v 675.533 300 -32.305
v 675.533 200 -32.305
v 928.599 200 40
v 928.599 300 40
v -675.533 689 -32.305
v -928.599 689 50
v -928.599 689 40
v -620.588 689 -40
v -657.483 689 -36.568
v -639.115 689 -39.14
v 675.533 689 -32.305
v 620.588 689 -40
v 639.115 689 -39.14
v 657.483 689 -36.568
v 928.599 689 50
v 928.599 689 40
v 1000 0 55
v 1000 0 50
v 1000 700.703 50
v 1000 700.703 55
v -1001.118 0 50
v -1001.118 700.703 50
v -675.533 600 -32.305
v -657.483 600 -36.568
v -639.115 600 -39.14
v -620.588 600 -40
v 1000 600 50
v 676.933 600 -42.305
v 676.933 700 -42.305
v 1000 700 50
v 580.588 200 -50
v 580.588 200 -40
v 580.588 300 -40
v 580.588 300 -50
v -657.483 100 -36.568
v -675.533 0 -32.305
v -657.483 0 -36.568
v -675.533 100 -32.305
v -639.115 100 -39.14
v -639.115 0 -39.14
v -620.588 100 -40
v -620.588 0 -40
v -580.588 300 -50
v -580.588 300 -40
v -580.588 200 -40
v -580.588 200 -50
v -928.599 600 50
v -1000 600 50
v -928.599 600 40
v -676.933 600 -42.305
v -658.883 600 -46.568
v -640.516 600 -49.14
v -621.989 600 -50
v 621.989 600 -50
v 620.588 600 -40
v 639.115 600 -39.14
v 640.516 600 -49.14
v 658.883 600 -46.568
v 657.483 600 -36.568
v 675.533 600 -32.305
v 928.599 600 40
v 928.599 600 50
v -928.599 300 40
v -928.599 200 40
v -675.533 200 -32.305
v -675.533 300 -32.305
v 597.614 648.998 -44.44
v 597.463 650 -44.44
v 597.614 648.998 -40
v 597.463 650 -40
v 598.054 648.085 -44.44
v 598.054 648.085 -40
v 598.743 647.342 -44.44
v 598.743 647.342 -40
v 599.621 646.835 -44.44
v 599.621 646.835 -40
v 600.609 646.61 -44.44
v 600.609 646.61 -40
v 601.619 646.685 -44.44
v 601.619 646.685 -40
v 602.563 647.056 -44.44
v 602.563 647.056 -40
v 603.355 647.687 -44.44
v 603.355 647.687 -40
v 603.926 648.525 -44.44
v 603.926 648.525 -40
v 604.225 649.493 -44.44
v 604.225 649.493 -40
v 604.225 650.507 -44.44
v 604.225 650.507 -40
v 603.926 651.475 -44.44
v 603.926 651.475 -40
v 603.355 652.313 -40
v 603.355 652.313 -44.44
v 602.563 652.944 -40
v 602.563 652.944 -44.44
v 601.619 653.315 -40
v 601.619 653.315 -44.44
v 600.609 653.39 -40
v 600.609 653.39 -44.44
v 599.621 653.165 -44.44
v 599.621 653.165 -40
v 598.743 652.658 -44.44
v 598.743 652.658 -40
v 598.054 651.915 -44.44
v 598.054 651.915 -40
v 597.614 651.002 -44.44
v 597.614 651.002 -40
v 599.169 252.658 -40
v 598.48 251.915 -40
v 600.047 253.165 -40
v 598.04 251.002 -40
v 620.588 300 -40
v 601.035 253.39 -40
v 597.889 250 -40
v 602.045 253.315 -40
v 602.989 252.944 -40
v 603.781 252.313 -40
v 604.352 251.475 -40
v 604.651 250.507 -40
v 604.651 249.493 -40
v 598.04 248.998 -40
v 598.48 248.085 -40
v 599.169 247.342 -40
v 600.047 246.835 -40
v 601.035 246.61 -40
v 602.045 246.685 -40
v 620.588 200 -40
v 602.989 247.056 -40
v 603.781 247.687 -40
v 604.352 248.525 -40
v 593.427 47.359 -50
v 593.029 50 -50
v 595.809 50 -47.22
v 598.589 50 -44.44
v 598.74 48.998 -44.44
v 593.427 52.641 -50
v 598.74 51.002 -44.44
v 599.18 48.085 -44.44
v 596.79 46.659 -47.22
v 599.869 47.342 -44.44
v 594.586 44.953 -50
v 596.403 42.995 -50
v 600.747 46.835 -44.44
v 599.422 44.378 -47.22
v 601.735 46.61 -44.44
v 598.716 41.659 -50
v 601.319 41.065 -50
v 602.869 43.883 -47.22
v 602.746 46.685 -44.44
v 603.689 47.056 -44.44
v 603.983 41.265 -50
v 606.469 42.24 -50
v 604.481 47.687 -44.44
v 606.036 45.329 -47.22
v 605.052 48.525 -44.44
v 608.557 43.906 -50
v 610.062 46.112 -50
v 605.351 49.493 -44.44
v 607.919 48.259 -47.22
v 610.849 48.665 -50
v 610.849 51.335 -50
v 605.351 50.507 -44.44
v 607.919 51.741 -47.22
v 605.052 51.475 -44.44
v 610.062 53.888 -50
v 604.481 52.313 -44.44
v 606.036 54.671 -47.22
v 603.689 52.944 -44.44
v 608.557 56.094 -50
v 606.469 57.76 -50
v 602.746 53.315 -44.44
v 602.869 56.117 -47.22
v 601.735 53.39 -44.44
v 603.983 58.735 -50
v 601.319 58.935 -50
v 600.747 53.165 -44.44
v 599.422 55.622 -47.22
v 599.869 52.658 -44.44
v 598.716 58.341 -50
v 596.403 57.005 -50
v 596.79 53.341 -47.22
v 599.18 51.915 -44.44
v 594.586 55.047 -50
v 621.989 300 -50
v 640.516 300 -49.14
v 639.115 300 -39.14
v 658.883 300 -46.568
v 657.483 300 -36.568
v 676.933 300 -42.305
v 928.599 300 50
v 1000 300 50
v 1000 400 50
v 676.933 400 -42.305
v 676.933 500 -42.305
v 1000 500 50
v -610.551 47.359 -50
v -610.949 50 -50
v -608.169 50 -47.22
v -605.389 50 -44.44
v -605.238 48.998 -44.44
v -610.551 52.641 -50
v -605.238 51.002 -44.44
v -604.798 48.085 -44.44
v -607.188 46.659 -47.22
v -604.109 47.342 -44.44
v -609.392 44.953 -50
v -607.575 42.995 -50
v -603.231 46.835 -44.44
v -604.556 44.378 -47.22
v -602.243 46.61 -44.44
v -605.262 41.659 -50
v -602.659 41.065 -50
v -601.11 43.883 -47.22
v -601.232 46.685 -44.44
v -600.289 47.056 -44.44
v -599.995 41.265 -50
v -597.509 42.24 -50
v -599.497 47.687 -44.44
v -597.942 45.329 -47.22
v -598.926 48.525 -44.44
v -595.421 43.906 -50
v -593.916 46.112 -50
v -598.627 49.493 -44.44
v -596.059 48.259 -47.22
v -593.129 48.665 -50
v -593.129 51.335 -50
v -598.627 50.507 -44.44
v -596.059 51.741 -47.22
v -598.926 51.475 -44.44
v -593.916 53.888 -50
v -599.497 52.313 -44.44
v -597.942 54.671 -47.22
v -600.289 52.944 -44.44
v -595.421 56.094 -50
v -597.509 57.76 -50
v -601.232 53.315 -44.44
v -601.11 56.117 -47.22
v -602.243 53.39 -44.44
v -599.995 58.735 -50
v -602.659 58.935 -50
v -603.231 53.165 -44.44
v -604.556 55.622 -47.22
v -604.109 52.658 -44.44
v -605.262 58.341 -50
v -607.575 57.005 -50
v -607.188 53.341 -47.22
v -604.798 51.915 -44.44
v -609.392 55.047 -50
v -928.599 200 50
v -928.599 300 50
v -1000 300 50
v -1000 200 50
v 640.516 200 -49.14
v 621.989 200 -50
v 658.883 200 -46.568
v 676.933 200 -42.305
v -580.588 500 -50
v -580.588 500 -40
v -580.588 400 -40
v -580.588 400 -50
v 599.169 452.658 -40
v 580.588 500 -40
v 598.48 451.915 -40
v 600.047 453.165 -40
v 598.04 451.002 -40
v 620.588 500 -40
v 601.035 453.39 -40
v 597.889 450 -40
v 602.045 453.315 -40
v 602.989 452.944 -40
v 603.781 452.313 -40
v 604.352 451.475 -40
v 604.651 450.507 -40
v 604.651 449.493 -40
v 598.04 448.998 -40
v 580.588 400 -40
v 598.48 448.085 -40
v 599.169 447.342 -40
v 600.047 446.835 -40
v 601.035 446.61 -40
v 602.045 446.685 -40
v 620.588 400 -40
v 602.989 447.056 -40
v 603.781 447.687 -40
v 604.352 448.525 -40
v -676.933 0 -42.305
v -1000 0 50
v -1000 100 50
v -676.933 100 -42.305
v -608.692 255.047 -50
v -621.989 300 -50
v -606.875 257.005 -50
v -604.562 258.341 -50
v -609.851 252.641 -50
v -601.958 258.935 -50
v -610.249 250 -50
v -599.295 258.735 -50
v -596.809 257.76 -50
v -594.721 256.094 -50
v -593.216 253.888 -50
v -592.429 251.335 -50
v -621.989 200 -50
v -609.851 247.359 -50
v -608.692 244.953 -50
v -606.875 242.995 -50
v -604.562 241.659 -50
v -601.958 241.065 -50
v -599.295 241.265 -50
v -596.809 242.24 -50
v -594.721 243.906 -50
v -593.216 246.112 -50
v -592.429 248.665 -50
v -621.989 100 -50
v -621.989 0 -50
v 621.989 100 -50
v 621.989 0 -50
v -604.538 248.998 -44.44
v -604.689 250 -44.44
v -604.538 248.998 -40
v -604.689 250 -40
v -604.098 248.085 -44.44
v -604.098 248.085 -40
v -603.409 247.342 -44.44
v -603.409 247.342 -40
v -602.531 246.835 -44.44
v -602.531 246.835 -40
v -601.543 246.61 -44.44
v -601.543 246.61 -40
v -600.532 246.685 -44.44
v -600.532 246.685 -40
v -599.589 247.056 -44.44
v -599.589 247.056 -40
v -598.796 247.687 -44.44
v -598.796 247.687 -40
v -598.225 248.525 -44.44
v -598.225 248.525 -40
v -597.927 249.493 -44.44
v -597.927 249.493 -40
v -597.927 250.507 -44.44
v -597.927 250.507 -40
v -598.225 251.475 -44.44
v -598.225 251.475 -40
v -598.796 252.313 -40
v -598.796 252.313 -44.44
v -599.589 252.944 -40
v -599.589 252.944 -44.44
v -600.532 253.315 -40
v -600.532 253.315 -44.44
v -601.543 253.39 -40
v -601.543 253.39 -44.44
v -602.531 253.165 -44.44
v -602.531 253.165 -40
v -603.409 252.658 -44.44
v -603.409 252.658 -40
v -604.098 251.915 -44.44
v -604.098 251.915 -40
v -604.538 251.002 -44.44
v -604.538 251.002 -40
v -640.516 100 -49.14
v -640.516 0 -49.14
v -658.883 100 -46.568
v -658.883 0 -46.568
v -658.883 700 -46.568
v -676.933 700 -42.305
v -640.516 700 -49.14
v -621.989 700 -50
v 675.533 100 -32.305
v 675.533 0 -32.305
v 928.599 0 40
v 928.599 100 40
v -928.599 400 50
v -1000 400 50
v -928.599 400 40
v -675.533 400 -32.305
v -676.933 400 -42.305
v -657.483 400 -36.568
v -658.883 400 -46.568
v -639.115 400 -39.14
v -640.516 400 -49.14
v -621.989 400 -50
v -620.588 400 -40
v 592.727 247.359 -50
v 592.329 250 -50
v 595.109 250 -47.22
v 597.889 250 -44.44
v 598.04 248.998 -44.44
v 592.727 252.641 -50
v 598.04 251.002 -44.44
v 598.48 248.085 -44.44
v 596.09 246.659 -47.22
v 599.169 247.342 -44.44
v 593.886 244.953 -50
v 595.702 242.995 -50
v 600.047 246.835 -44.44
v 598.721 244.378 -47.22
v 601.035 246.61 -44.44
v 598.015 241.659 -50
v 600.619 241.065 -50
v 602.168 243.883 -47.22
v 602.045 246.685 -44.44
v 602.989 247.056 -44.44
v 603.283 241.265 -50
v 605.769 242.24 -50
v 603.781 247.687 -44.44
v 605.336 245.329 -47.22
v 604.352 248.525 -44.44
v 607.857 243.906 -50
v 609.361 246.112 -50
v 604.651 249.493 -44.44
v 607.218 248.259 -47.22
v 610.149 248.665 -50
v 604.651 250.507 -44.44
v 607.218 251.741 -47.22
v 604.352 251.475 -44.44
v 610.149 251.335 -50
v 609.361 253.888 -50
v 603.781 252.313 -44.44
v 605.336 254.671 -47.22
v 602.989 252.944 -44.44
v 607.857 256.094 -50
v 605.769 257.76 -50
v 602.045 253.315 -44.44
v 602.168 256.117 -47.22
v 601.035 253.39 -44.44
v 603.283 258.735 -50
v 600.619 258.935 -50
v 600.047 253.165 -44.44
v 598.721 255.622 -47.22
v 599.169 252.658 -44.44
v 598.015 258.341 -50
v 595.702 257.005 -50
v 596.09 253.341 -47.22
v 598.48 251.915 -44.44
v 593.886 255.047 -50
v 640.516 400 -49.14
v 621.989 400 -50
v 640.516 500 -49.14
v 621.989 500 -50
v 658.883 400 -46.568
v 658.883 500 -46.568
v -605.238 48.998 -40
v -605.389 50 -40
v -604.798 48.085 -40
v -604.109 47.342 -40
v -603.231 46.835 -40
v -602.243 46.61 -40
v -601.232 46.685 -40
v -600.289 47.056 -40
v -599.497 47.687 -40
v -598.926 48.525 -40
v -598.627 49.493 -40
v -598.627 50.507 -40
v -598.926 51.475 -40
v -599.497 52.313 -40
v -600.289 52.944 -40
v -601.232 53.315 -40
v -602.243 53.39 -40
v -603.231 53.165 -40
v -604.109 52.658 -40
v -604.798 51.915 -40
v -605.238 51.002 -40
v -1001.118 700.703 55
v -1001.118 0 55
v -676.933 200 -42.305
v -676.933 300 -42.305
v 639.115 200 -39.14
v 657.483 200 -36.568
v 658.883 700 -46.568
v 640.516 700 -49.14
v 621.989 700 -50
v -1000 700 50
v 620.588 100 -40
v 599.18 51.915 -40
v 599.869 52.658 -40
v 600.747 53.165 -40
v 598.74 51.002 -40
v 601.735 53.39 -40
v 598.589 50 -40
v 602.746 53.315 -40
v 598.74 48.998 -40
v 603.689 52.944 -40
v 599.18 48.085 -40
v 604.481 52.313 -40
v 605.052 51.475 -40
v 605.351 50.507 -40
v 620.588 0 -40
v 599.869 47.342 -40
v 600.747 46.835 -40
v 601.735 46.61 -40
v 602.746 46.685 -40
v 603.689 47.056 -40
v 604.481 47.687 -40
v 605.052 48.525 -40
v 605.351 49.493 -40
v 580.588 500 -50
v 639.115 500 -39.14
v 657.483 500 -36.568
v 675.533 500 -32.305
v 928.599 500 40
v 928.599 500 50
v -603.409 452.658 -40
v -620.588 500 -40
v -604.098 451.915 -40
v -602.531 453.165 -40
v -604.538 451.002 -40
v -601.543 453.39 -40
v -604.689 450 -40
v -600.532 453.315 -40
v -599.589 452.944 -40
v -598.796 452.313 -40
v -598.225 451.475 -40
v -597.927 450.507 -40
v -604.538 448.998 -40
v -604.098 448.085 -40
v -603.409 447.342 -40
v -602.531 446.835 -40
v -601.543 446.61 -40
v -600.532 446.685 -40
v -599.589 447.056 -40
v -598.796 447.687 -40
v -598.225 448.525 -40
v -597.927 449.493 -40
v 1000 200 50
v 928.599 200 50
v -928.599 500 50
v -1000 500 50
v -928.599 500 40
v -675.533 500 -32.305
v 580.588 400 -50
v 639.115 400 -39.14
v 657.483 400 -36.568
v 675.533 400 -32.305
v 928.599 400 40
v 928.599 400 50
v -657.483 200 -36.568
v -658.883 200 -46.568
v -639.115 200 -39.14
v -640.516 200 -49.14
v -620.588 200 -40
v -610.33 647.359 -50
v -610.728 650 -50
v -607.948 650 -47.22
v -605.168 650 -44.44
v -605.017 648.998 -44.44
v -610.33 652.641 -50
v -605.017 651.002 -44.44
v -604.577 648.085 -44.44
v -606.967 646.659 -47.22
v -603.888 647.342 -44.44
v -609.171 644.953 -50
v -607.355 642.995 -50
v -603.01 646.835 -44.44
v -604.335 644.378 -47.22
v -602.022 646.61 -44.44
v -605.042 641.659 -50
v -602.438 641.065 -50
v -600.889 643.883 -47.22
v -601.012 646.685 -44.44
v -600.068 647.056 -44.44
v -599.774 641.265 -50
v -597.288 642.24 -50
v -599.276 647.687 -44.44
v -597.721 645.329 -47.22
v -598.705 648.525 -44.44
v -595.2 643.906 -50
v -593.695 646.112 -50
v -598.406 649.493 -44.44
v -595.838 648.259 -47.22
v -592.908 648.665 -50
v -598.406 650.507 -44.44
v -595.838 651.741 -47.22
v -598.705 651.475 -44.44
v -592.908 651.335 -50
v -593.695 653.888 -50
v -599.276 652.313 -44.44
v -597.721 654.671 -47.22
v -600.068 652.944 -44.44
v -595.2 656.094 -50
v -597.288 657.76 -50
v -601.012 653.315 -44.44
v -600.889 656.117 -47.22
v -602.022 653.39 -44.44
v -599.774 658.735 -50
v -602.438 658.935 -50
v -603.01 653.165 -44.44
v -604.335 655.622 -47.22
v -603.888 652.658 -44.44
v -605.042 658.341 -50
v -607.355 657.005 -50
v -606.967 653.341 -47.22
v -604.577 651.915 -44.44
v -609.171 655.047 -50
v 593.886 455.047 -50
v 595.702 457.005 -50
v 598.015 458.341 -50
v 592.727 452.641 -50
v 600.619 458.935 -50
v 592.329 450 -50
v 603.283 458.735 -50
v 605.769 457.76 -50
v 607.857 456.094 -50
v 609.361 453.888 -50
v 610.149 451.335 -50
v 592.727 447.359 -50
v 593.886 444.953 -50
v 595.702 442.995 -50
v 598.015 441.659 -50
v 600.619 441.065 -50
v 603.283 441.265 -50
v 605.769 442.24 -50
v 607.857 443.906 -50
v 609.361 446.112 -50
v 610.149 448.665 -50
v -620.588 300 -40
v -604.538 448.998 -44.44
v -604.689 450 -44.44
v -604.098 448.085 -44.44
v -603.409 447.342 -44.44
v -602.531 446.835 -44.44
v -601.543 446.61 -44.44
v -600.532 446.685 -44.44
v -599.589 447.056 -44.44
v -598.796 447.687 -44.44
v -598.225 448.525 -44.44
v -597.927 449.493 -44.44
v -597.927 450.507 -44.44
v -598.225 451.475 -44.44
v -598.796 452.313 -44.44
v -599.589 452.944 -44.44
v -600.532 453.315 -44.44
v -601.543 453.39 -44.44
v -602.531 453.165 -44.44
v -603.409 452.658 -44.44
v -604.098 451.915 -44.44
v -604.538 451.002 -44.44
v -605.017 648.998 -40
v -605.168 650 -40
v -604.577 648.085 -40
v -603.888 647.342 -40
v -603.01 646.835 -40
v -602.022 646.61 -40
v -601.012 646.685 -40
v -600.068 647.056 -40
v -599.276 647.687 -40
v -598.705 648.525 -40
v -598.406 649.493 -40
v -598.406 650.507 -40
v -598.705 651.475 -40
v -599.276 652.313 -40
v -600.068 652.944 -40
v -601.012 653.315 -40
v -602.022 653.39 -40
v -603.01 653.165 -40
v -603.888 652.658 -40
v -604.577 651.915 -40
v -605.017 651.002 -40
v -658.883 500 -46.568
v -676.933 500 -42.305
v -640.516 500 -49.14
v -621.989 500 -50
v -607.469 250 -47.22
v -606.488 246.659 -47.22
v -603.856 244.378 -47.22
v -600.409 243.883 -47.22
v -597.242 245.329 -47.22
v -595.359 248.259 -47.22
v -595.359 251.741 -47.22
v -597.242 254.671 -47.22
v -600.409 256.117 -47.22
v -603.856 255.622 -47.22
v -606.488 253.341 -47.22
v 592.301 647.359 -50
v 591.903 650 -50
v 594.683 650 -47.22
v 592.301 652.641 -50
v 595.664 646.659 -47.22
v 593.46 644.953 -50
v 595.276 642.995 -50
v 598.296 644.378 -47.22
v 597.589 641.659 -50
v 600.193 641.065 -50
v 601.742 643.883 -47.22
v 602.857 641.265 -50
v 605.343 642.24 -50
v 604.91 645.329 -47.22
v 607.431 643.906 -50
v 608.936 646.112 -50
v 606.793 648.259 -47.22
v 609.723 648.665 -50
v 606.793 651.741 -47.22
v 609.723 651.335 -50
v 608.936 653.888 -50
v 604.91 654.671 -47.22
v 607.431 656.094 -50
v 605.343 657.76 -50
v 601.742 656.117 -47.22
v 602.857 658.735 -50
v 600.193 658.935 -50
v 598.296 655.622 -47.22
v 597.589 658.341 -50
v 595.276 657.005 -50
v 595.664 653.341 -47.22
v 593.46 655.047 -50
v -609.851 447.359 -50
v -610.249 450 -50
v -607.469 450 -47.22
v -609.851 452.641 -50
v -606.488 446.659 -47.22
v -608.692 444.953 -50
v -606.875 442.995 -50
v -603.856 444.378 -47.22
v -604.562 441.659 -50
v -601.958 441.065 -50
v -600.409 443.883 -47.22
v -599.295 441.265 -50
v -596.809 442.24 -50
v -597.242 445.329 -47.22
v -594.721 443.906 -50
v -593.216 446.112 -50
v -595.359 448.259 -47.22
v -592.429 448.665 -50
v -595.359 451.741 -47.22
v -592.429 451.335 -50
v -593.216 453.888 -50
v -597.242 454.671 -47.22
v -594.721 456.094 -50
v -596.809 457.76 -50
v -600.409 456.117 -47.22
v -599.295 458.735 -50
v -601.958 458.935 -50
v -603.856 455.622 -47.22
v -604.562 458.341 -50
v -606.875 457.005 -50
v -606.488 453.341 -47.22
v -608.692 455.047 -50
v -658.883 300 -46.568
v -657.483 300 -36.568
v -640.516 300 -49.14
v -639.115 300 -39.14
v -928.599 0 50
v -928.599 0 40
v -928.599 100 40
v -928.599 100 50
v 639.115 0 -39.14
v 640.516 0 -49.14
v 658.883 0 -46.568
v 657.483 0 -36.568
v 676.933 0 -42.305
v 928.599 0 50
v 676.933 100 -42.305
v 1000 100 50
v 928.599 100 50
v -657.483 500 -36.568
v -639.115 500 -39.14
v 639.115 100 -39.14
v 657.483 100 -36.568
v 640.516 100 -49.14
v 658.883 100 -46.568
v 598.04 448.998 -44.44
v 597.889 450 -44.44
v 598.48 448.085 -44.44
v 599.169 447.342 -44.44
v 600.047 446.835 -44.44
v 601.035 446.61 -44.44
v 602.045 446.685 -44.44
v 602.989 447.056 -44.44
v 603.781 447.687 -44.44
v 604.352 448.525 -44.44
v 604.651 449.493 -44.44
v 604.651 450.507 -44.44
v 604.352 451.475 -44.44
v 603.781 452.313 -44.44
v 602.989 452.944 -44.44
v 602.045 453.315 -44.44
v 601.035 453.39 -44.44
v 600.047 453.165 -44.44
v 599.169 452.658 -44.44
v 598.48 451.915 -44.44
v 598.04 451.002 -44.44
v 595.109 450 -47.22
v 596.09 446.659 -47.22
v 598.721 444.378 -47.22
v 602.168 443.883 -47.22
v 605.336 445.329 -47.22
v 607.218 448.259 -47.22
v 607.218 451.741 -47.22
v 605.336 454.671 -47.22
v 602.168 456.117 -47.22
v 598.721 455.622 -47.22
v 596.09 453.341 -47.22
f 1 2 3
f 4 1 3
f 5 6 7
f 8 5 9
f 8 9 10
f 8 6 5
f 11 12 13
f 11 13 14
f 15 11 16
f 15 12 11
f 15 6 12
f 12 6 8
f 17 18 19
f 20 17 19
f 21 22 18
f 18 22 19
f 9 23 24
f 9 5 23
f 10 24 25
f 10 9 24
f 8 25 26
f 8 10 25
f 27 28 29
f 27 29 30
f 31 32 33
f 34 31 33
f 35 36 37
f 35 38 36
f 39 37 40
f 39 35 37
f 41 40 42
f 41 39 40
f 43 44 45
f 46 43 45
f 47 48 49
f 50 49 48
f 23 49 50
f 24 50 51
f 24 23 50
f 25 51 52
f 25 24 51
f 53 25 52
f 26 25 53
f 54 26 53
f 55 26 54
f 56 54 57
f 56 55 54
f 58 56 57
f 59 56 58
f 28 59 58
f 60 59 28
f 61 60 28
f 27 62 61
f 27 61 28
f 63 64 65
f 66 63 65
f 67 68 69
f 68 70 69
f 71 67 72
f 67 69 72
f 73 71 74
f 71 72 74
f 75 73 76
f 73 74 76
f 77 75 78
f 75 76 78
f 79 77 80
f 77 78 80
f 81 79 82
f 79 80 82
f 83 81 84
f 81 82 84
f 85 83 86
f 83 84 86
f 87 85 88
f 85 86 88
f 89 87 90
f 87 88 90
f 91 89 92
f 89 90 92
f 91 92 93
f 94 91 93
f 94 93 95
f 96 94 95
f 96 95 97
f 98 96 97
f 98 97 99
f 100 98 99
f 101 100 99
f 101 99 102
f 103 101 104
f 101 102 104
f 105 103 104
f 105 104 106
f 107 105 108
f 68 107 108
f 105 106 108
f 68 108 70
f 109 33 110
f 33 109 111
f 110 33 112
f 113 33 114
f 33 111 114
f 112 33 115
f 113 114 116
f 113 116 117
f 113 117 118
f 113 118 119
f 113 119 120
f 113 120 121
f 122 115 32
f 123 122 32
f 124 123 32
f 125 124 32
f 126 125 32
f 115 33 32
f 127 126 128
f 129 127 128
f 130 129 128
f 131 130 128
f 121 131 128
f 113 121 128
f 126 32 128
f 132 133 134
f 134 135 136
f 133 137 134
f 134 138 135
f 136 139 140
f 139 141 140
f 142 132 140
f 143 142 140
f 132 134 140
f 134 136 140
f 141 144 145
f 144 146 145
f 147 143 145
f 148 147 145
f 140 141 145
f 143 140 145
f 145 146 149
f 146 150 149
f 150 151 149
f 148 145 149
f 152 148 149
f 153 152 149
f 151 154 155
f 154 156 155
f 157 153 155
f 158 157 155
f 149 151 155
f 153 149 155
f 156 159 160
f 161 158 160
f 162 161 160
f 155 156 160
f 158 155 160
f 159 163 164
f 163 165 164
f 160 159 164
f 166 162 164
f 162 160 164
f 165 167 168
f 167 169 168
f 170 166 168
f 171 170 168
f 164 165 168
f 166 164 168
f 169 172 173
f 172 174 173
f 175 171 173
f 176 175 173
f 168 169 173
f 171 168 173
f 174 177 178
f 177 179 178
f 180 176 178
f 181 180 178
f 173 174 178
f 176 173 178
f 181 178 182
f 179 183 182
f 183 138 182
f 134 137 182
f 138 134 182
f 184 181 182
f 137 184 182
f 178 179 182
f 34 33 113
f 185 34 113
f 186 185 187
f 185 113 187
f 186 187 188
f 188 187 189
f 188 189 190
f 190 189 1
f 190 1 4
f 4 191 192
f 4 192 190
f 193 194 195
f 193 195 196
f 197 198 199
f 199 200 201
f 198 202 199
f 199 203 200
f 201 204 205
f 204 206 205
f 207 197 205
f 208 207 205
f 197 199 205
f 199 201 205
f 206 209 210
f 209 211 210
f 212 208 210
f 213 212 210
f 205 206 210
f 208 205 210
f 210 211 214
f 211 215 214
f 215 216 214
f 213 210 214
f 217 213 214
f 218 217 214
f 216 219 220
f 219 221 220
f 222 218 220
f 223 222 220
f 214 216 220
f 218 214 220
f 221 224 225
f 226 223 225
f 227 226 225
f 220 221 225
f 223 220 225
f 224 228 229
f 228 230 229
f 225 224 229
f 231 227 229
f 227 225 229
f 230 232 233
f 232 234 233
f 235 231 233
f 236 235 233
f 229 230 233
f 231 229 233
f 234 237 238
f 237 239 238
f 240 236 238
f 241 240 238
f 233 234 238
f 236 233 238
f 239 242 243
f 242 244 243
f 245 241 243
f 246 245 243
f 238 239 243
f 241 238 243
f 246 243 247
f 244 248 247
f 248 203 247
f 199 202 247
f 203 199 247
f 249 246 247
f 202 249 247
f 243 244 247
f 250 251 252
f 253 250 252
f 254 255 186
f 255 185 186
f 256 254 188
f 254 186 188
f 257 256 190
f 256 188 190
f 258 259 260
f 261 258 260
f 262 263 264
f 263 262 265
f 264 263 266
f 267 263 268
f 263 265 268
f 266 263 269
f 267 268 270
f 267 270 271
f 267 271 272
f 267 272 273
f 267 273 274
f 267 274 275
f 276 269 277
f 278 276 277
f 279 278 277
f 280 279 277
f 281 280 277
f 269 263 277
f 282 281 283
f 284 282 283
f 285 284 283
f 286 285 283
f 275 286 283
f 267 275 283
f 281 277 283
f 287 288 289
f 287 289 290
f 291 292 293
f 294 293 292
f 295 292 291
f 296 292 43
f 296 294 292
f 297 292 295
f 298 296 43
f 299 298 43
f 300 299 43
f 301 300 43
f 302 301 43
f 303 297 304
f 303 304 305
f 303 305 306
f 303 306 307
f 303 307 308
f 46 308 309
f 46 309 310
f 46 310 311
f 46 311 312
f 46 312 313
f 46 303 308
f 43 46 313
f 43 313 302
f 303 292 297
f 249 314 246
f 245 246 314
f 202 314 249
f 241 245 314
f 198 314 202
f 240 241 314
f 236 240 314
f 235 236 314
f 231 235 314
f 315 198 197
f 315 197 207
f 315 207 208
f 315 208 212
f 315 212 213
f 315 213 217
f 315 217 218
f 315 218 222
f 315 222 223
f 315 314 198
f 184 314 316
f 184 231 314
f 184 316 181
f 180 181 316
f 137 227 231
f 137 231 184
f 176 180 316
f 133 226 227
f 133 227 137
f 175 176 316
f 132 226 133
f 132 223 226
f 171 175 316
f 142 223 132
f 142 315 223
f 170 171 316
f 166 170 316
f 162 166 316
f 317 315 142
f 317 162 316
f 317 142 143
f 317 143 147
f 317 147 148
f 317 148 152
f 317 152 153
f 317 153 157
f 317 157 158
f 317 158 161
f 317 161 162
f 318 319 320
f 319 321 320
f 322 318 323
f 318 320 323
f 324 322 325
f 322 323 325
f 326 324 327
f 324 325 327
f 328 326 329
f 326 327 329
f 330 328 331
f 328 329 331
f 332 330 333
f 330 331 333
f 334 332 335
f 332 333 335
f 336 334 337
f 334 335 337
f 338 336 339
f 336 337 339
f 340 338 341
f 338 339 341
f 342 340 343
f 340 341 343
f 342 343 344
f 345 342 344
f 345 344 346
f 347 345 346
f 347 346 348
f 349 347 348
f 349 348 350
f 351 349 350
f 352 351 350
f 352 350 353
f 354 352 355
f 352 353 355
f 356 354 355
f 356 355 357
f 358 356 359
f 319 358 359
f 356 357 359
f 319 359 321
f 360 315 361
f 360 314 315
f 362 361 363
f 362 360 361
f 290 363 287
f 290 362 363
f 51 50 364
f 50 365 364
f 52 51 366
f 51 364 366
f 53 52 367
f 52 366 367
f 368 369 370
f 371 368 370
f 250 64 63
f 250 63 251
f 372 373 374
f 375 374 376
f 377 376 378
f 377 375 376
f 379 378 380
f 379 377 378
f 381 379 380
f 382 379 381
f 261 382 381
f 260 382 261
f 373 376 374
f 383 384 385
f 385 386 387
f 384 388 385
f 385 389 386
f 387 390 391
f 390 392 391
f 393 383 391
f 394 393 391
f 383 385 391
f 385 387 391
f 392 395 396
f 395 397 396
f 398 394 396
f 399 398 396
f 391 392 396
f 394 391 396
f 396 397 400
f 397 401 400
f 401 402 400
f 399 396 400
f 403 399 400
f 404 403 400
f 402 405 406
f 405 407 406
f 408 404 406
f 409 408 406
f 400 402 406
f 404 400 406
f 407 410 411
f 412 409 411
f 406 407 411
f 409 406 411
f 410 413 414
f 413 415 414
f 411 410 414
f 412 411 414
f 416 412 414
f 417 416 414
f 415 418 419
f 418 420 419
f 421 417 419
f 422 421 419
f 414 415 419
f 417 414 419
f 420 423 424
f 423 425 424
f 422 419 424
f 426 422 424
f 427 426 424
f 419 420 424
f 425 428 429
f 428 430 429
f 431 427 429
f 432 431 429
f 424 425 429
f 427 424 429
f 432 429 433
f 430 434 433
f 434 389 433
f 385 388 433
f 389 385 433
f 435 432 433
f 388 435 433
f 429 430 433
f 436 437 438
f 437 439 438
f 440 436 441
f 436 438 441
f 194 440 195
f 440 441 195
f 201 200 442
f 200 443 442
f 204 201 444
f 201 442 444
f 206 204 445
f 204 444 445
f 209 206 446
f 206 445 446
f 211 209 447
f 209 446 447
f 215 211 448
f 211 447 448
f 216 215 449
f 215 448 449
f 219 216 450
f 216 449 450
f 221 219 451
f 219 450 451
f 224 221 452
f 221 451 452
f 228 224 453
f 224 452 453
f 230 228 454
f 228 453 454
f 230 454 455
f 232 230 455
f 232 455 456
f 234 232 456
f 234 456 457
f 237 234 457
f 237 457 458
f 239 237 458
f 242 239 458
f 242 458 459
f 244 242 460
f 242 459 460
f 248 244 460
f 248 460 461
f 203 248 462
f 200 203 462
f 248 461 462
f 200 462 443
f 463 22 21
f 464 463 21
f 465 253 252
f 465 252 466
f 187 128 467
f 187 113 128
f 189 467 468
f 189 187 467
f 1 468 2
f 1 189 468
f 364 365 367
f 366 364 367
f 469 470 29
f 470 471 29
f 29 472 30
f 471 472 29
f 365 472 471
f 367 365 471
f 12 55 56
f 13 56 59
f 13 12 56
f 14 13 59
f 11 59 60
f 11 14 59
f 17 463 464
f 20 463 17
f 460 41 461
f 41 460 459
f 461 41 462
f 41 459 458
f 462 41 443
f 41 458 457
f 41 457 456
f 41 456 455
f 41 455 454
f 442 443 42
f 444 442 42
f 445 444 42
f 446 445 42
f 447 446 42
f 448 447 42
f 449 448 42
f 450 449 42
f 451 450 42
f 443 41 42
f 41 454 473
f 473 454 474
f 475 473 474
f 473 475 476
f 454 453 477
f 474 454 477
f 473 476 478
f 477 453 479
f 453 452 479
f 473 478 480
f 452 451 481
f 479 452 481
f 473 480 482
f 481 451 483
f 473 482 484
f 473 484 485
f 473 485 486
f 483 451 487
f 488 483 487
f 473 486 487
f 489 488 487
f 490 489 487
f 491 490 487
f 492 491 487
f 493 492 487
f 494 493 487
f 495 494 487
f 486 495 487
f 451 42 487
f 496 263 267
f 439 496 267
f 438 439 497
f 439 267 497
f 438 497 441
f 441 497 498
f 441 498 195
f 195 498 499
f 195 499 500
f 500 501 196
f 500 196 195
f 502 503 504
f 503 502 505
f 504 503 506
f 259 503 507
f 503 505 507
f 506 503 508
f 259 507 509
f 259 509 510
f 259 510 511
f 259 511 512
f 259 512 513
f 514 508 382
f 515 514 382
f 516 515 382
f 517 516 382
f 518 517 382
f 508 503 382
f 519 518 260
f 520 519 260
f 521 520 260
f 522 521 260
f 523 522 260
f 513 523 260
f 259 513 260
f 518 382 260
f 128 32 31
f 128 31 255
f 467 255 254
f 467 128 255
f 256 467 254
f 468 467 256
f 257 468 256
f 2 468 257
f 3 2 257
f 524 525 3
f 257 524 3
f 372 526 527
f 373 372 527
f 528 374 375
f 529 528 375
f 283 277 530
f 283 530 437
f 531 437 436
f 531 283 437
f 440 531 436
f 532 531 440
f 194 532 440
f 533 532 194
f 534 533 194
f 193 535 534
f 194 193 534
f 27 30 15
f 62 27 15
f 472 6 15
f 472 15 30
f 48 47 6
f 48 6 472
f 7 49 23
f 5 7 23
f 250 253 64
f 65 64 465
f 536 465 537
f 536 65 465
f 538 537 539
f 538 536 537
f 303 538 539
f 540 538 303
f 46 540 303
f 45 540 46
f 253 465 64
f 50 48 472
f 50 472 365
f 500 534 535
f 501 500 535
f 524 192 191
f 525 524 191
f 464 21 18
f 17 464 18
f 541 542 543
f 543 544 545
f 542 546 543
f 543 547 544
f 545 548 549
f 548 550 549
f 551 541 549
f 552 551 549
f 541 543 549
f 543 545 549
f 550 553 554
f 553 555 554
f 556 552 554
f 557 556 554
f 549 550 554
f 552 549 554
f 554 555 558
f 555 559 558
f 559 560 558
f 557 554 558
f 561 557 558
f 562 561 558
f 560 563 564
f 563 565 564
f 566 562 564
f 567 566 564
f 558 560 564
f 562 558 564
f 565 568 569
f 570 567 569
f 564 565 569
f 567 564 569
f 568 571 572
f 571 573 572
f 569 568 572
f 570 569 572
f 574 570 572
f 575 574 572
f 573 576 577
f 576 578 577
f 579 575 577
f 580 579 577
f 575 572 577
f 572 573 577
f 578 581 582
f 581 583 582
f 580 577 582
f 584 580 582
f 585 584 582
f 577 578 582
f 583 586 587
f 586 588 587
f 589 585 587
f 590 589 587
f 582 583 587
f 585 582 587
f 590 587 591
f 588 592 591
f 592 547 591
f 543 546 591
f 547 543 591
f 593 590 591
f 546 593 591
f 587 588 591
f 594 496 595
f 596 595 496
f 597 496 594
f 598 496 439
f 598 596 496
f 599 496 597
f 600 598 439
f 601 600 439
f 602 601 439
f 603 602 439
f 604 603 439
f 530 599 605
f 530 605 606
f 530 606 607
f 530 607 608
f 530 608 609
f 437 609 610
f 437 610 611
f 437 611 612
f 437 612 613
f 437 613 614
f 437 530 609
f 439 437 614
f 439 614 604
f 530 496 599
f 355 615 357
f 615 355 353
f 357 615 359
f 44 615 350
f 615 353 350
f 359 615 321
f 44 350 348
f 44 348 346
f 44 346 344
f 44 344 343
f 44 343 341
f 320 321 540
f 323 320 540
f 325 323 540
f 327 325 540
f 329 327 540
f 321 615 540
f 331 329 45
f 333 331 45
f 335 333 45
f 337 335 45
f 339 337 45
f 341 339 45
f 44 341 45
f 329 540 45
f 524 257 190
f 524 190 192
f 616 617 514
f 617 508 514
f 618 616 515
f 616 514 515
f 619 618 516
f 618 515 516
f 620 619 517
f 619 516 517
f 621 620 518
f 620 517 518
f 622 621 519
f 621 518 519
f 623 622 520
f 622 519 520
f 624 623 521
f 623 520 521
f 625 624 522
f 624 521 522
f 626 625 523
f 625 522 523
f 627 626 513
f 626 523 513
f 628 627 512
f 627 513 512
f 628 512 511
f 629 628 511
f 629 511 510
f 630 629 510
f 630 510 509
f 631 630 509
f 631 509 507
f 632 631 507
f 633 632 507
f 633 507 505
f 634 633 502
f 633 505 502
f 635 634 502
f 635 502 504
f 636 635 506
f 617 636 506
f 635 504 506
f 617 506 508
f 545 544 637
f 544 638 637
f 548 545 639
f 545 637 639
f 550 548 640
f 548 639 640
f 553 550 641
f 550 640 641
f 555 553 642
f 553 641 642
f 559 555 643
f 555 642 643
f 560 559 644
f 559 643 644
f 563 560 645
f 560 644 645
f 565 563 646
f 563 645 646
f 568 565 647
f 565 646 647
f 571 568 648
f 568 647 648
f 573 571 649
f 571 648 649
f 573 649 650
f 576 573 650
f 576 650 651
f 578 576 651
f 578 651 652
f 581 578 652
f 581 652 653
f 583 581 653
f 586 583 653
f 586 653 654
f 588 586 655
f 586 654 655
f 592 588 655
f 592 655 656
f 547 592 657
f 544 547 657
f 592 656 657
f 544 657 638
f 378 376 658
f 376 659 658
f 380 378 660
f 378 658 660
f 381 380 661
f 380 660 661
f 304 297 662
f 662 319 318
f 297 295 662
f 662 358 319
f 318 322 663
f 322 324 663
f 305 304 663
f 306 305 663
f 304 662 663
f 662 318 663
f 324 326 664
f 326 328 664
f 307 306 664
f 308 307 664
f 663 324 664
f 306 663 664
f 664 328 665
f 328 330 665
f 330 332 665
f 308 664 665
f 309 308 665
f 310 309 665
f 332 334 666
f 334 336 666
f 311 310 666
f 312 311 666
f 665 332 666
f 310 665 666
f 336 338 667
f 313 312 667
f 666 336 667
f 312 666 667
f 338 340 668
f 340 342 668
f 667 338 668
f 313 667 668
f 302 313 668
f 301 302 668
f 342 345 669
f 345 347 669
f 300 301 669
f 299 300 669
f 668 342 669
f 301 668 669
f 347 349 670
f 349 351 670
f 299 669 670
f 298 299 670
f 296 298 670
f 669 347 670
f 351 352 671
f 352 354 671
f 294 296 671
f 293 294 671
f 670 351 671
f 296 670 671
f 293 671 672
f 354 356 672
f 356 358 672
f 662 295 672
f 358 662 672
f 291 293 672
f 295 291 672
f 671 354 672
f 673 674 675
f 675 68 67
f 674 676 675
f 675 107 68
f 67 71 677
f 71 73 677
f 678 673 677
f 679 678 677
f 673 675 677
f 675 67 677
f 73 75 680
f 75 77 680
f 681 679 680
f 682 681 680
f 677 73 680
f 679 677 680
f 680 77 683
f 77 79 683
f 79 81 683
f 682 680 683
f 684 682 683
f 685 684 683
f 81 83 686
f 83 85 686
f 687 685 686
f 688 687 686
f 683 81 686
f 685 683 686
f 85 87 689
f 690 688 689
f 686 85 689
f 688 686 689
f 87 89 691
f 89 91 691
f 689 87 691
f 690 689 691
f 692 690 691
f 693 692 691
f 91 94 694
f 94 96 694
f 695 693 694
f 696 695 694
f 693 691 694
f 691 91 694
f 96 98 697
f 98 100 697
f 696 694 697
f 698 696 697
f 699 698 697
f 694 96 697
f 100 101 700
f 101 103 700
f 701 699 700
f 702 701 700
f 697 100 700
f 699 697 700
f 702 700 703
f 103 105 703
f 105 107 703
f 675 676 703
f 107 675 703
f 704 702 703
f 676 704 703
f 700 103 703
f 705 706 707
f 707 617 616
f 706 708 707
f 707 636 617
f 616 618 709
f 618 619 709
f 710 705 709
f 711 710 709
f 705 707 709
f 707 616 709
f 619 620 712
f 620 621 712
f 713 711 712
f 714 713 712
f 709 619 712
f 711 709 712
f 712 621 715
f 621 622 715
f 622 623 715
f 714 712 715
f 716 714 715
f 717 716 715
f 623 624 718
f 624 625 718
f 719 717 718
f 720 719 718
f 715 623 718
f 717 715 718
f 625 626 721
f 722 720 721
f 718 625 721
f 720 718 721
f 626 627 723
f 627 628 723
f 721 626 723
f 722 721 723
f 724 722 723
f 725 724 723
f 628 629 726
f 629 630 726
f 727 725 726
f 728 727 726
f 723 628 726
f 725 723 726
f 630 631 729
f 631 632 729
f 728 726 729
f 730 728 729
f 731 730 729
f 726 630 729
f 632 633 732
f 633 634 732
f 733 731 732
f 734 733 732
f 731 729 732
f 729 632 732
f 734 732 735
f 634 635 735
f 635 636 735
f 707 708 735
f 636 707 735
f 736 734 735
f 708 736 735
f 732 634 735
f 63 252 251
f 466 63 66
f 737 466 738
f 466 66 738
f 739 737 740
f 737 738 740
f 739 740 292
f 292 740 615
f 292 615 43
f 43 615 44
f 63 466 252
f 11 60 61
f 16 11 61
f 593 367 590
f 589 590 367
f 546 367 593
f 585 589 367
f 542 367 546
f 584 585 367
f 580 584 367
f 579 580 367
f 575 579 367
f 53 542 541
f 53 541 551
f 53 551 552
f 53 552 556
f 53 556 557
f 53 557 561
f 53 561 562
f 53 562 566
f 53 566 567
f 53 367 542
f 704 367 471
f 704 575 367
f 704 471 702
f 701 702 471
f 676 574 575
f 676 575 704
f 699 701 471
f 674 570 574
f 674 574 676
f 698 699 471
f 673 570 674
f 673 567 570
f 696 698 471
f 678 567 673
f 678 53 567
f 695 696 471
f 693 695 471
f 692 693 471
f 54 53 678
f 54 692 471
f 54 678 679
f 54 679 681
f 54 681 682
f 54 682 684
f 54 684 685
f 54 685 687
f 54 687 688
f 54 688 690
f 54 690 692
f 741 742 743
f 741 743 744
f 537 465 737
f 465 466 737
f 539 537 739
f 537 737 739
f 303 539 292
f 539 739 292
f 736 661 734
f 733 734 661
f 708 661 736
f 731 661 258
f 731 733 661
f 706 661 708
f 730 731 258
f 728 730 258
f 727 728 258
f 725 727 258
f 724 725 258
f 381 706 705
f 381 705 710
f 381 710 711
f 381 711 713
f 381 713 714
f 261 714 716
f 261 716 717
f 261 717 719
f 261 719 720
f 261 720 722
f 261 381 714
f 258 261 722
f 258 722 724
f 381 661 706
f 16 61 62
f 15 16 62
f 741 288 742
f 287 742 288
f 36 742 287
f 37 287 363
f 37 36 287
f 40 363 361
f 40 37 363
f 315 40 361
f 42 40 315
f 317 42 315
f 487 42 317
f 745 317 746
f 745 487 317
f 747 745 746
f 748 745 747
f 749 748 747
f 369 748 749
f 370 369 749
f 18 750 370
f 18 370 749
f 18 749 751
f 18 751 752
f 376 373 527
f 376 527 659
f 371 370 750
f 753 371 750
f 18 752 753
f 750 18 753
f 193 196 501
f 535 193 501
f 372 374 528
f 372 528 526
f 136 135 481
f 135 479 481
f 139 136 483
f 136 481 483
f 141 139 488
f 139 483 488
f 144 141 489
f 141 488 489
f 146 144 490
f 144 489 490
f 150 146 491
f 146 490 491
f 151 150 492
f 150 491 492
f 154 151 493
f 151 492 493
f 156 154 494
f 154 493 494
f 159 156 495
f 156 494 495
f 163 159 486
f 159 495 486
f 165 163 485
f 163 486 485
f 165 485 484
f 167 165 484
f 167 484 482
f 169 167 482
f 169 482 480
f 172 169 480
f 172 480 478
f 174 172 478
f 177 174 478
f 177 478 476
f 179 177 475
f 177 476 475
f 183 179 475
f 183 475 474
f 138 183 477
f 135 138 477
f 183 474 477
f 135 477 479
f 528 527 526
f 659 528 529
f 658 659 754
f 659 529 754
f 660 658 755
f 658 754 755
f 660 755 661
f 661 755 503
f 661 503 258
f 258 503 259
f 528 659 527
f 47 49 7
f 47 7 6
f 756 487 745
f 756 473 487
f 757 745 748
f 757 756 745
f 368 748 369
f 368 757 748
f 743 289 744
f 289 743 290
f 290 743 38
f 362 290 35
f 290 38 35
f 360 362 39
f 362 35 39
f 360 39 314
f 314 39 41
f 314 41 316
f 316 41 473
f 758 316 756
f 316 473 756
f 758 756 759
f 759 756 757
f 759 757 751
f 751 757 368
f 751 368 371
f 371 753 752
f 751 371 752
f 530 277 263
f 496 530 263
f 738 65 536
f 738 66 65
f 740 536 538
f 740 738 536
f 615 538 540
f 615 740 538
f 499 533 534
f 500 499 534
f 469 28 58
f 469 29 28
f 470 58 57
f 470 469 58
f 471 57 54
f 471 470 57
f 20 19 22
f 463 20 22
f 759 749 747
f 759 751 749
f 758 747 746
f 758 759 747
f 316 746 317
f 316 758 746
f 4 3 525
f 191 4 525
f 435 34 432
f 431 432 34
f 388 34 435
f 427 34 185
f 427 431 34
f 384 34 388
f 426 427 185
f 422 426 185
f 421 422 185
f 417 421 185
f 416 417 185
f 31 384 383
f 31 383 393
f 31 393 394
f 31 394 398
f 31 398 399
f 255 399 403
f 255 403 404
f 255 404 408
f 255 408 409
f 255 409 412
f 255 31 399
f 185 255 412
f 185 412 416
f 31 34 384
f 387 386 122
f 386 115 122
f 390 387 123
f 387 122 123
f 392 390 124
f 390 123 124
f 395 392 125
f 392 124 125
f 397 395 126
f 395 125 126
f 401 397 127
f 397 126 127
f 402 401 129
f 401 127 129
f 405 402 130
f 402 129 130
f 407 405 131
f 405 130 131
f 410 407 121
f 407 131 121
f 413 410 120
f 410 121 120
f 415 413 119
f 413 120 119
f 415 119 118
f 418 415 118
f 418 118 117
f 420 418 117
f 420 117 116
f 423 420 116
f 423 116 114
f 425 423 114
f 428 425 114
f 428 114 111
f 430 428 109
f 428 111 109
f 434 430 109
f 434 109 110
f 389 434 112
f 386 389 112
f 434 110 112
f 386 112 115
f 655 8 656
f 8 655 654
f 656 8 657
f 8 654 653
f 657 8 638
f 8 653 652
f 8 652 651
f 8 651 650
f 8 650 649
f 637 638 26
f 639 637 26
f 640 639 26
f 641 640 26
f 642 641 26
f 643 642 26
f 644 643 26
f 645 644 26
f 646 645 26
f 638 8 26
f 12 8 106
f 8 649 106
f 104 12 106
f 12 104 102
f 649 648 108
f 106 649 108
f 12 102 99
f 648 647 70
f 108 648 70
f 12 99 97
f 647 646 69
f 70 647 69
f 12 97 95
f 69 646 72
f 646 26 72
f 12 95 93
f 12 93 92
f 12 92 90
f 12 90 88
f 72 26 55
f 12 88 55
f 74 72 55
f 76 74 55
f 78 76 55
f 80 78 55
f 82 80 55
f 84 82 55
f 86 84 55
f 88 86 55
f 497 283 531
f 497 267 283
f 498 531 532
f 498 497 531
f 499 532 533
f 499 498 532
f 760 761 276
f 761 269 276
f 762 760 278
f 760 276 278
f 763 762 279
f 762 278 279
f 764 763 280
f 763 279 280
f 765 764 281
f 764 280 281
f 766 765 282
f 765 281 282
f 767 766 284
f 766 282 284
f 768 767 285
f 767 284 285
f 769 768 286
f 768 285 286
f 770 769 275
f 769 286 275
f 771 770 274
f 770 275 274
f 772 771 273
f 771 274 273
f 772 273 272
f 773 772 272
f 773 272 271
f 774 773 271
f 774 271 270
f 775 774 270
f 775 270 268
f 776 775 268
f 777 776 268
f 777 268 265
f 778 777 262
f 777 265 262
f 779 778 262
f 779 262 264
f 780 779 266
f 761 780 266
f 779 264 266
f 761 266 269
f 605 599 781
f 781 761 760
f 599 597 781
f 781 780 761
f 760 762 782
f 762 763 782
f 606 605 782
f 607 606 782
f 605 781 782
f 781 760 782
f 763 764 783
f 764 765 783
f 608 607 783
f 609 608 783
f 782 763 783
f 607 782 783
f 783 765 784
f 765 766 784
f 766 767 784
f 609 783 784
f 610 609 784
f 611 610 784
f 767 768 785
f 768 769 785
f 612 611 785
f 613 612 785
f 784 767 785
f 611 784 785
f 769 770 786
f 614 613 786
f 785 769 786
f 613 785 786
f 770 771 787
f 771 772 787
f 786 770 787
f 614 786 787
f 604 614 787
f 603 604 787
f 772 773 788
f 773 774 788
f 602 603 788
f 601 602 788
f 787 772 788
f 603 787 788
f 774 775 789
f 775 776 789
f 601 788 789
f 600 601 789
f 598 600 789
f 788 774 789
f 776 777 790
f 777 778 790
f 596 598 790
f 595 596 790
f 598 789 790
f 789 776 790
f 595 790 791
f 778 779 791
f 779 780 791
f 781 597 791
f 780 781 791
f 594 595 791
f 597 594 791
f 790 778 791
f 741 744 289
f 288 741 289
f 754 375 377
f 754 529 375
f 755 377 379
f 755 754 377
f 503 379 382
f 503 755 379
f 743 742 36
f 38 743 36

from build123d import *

# Parameters (mm, degrees)
F1_DEPTH        = 700
F2_W            = 2000
F2_H            = 100
F3_DEPTH        = 680
F4_W            = 1857.1988883398
F4_H            = 10.0000008941
F5_DEPTH        = 689
F7_DEPTH        = 10
F8_R            = 200
F9_R            = 200
F11_W           = 1161.1769230007
F11_H           = 206.3662915144
F11_H_2         = 100
F11_H_3         = 47.0509885464
F12_DEPTH       = 175
F14_D           = 6.8
F14_DEPTH       = 15.75
F14_CSINK_D     = 17.92
F14_CSINK_ANGLE = 90
F14_TIP         = 2.0429261047
F16_D           = 6.8
F16_DEPTH       = 15.75
F16_CSINK_D     = 17.92
F16_CSINK_ANGLE = 90
F16_TIP         = 2.0429261047
F18_D           = 6.8
F18_DEPTH       = 15.75
F18_CSINK_D     = 17.92
F18_CSINK_ANGLE = 90
F18_TIP         = 2.0429261047
F19_W           = 71.4005558301
F19_H           = 100
F20_DEPTH       = 5
F22_D           = 6.8
F22_DEPTH       = 15.75
F22_CSINK_D     = 17.92
F22_CSINK_ANGLE = 90
F22_TIP         = 2.0429261047
F24_D           = 6.8
F24_DEPTH       = 15.75
F24_CSINK_D     = 17.92
F24_CSINK_ANGLE = 90
F24_TIP         = 2.0429261047
F26_D           = 6.8
F26_DEPTH       = 15.75
F26_CSINK_D     = 17.92
F26_CSINK_ANGLE = 90
F26_TIP         = 2.0429261047


with BuildPart() as f1:
    # F0 (on Front) → F1 (new body)
    with BuildSketch(Plane.XZ):
        Polygon((1000, 50), (-1000, 50), (-650, -50), (650, -50), align=None)
    extrude(amount=-F1_DEPTH)

    # F2 (on face) → F3 (cut)
    with BuildSketch(Plane.XY.offset(50)):
        with Locations((0, 550)):
            Rectangle(F2_W, F2_H)
        with Locations((0, 350)):
            Rectangle(F2_W, F2_H)
        with Locations((0, 150)):
            Rectangle(F2_W, F2_H)
    extrude(amount=-F3_DEPTH, mode=Mode.SUBTRACT)

    # F4 (on face) → F5 (cut)
    with BuildSketch(Plane.XZ):
        Polygon((928.5994441699, 39.9999991059), (-928.5994441699, 39.9999991059), (-648.5994504284, -39.9999991059), (648.5994504284, -39.9999991059), align=None)
        with Locations((0, 44.999999553)):
            Rectangle(F4_W, F4_H)
    extrude(amount=-F5_DEPTH, mode=Mode.SUBTRACT)

    # F8
    f8_edges = [f1.edges().sort_by_distance(p)[0] for p in [
        (-650, 250, -50),
        (-650, 50, -50),
        (-650, 450, -50),
        (-650, 650, -50),
        (650, 650, -50),
        (650, 450, -50),
        (650, 250, -50),
        (650, 50, -50),
        (-648.59945, 250, -39.999999),
        (-648.59945, 50, -39.999999),
        (-648.59945, 450, -39.999999),
        (-648.59945, 644.5, -39.999999),
        (648.59945, 250, -39.999999),
        (648.59945, 50, -39.999999),
        (648.59945, 644.5, -39.999999),
    ]]
    fillet(f8_edges, radius=F8_R)

    # F9
    f9_edges = [f1.edges().sort_by_distance(p)[0] for p in [
        (648.59945, 450, -39.999999),
    ]]
    fillet(f9_edges, radius=F9_R)

    # F11 (on face) → F12 (cut)
    with BuildSketch(Plane.XY.offset(-39.9999991059)):
        with Locations((0, 403.1831457572)):
            Rectangle(F11_W, F11_H)
        with Locations((0, 250)):
            Rectangle(F11_W, F11_H_2)
        with Locations((0, 176.4745057268)):
            Rectangle(F11_W, F11_H_3)
    extrude(amount=-F12_DEPTH, mode=Mode.SUBTRACT)

    # F14
    with Locations(Plane(origin=(0, 0, -50), x_dir=(1, 0, 0), z_dir=(0, 0, -1))):
        with Locations((-601.2887362861, -250)):
            CounterSinkHole(F14_D / 2, F14_CSINK_D / 2, depth=F14_DEPTH, counter_sink_angle=F14_CSINK_ANGLE)
            with Locations((0, 0, -(F14_DEPTH + F14_TIP / 2))):  # 118° drill point
                Cone(0, F14_D / 2, F14_TIP, mode=Mode.SUBTRACT)

    # F16
    with Locations(Plane(origin=(0, 0, -50), x_dir=(1, 0, 0), z_dir=(0, 0, -1))):
        with Locations((-601.2887362861, -450)):
            CounterSinkHole(F16_D / 2, F16_CSINK_D / 2, depth=F16_DEPTH, counter_sink_angle=F16_CSINK_ANGLE)
            with Locations((0, 0, -(F16_DEPTH + F16_TIP / 2))):  # 118° drill point
                Cone(0, F16_D / 2, F16_TIP, mode=Mode.SUBTRACT)

    # F18
    with Locations(Plane(origin=(0, 0, -50), x_dir=(1, 0, 0), z_dir=(0, 0, -1))):
        with Locations((-601.7680764198, -650), (600.8628606796, -650)):
            CounterSinkHole(F18_D / 2, F18_CSINK_D / 2, depth=F18_DEPTH, counter_sink_angle=F18_CSINK_ANGLE)
            with Locations((0, 0, -(F18_DEPTH + F18_TIP / 2))):  # 118° drill point
                Cone(0, F18_D / 2, F18_TIP, mode=Mode.SUBTRACT)

    # F22
    with Locations(Plane(origin=(0, 0, -50), x_dir=(1, 0, 0), z_dir=(0, 0, -1))):
        with Locations((601.2887362861, -450)):
            CounterSinkHole(F22_D / 2, F22_CSINK_D / 2, depth=F22_DEPTH, counter_sink_angle=F22_CSINK_ANGLE)
            with Locations((0, 0, -(F22_DEPTH + F22_TIP / 2))):  # 118° drill point
                Cone(0, F22_D / 2, F22_TIP, mode=Mode.SUBTRACT)

    # F24
    with Locations(Plane(origin=(0, 0, -50), x_dir=(1, 0, 0), z_dir=(0, 0, -1))):
        with Locations((601.2887362861, -250)):
            CounterSinkHole(F24_D / 2, F24_CSINK_D / 2, depth=F24_DEPTH, counter_sink_angle=F24_CSINK_ANGLE)
            with Locations((0, 0, -(F24_DEPTH + F24_TIP / 2))):  # 118° drill point
                Cone(0, F24_D / 2, F24_TIP, mode=Mode.SUBTRACT)

    # F26
    with Locations(Plane(origin=(0, 0, -50), x_dir=(1, 0, 0), z_dir=(0, 0, -1))):
        with Locations((601.9890110719, -50), (-601.9890110719, -50)):
            CounterSinkHole(F26_D / 2, F26_CSINK_D / 2, depth=F26_DEPTH, counter_sink_angle=F26_CSINK_ANGLE)
            with Locations((0, 0, -(F26_DEPTH + F26_TIP / 2))):  # 118° drill point
                Cone(0, F26_D / 2, F26_TIP, mode=Mode.SUBTRACT)


with BuildPart() as f7:
    # F6 (on face) → F7 (new body)
    with BuildSketch(Plane.XY.offset(50)):
        Polygon((1000, 700), (-1000, 700), (-1000, 600), (-930.0000071526, 600), (-930.0000071526, 680), (-928.5994441699, 680), (-928.5994441699, 689), (928.5994441699, 689), (928.5994441699, 680), (930.3787350655, 680), (930.3787350655, 600), (1000, 600), align=None)
        Polygon((1000.3787279129, 700), (1000, 700), (1000, 600), (930.3787350655, 600), (930.3787350655, 20), (-930.0000071526, 20), (-930.0000071526, 600), (-1000, 600), (-1000, 0), (1000.3787279129, 0), align=None)
    extrude(amount=F7_DEPTH)


with BuildPart() as f20:
    # F19 (on face) → F20 (new body)
    with BuildSketch(Plane.XY.offset(50)):
        with Locations((964.2997220849, 50)):
            Rectangle(F19_W, F19_H)
        Polygon((-1001.1179447174, 0), (928.5994441699, 0), (928.5994441699, 100), (1000, 100), (1000, 700.7029652596), (-1001.1179447174, 700.7029652596), align=None)
    extrude(amount=F20_DEPTH)


solid = Compound([f1.part, f20.part])
